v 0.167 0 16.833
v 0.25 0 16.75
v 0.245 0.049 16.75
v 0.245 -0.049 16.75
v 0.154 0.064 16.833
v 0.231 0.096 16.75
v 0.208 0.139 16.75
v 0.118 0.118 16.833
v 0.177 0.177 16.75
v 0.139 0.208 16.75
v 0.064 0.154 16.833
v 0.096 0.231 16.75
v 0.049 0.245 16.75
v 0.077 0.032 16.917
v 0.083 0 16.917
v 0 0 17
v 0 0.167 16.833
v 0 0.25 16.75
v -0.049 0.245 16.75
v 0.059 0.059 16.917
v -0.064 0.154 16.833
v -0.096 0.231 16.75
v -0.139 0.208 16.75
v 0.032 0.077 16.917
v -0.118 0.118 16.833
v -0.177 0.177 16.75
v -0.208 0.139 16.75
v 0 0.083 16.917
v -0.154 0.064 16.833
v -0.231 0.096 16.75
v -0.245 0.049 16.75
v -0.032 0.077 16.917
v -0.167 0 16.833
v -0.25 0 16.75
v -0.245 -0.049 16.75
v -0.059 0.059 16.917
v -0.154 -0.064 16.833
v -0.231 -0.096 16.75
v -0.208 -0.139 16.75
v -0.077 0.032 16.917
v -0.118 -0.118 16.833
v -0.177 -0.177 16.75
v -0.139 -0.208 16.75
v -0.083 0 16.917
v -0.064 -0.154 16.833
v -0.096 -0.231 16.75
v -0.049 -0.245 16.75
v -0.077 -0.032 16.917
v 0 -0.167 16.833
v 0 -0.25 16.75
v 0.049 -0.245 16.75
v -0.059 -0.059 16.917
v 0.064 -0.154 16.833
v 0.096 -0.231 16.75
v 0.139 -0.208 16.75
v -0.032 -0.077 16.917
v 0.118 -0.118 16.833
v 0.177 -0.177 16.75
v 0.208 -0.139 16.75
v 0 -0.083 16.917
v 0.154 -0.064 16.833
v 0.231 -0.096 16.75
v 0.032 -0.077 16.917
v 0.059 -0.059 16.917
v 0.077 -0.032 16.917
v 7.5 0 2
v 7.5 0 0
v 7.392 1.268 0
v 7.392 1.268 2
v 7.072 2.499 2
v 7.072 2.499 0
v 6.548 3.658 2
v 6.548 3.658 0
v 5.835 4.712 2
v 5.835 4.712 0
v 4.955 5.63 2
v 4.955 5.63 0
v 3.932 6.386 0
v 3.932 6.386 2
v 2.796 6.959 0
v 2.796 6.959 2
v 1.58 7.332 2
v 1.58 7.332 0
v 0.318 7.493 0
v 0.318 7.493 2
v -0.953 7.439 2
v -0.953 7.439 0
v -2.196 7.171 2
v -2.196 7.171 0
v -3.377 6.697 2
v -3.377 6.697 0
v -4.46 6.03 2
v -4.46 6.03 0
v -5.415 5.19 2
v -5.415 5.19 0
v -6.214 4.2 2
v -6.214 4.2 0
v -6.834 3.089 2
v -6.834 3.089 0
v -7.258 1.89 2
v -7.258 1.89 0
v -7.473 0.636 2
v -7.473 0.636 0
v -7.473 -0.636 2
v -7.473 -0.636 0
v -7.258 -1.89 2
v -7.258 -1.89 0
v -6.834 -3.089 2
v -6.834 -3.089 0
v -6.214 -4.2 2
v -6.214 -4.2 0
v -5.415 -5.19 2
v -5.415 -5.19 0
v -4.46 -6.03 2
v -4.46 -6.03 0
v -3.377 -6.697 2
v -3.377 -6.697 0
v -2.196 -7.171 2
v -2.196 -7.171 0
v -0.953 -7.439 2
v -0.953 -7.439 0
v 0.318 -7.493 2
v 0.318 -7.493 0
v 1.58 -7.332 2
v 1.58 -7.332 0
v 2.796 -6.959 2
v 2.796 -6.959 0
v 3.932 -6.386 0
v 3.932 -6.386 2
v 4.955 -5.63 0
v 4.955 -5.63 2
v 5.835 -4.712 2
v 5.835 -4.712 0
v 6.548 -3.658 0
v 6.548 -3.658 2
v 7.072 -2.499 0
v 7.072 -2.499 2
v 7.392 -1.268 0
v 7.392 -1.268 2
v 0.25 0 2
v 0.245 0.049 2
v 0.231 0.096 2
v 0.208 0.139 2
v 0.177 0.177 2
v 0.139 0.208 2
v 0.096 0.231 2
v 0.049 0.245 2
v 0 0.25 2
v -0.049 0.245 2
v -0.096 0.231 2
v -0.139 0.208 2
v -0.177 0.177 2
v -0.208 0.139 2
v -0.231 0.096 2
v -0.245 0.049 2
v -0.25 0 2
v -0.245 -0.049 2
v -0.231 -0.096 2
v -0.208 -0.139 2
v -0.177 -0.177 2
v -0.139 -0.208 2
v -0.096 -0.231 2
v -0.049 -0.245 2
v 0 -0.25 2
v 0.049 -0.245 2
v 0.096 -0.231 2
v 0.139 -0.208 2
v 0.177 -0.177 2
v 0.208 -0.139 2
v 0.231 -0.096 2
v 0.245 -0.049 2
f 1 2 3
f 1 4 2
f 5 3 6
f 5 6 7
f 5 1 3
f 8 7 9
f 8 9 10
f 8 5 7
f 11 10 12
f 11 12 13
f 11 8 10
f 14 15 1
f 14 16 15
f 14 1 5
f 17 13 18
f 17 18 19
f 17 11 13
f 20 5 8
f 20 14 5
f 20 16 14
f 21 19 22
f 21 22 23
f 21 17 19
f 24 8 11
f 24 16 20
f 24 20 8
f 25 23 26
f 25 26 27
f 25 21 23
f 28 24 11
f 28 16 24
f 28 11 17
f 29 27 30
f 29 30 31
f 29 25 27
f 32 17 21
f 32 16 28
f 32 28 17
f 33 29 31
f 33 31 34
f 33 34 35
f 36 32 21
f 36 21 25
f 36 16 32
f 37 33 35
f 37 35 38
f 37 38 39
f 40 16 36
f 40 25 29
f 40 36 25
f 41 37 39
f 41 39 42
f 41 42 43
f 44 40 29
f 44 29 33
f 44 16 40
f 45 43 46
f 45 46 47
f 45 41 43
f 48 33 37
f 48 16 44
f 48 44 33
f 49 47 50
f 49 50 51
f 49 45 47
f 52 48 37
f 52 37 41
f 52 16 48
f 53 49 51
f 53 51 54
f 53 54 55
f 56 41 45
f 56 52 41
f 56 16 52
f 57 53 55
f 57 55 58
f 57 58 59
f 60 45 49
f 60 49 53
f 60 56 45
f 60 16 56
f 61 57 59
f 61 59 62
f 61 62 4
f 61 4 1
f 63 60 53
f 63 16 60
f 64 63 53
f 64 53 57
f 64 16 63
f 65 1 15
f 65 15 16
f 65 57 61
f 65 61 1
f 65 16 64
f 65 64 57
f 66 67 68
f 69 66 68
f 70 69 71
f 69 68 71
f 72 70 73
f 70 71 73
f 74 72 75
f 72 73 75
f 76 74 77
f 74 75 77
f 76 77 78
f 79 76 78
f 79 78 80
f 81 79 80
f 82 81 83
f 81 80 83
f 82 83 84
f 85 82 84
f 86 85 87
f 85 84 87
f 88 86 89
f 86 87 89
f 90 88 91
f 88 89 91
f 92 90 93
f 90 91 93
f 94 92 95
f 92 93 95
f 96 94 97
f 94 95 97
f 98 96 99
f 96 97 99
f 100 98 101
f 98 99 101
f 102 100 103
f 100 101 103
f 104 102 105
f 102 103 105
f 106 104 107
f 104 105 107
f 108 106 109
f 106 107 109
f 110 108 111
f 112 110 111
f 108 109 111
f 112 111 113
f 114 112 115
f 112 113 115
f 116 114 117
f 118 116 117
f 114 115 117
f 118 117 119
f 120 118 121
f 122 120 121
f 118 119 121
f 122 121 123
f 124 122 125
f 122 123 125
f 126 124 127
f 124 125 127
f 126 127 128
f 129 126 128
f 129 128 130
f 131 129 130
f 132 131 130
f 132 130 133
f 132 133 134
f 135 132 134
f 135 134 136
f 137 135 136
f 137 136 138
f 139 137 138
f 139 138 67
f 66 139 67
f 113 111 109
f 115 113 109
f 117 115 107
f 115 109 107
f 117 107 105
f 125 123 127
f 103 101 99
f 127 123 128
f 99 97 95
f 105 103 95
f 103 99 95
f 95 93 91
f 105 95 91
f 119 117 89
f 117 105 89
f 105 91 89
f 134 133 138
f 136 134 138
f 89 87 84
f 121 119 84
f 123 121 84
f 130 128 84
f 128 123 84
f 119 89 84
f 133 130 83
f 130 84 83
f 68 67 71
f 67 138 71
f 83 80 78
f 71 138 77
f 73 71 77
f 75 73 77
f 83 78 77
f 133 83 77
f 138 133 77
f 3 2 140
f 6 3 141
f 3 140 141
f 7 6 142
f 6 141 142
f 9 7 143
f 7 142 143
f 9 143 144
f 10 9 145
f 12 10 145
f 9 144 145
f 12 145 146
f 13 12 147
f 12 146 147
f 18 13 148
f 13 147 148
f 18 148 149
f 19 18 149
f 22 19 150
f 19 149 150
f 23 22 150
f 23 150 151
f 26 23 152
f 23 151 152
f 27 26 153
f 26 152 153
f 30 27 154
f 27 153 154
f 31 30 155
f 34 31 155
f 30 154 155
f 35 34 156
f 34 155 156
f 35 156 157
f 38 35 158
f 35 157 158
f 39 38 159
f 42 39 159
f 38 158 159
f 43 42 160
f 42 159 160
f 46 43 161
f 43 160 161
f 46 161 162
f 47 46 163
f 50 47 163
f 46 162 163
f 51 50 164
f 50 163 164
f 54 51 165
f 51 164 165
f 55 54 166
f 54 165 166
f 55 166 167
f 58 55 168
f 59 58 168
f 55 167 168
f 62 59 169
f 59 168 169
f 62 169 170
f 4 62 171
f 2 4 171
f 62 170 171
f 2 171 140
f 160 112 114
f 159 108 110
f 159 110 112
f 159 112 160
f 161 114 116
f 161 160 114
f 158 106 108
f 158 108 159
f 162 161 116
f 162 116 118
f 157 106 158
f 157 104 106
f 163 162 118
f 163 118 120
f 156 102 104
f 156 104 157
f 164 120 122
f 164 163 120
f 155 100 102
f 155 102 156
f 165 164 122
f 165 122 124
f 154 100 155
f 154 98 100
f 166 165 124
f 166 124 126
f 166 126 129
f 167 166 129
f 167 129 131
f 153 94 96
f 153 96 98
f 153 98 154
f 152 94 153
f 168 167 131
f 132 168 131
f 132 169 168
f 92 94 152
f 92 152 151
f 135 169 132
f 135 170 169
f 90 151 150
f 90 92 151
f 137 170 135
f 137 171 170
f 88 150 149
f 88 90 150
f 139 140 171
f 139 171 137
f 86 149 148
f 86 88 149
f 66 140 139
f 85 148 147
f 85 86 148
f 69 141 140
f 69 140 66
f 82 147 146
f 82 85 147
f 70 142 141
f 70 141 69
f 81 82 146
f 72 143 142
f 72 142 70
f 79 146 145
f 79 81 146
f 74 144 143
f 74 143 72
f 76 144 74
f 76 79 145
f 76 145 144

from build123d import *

# Parameters (mm, degrees)
SKETCH1_R           = 7.5
BOSS_EXTRUDE1_DEPTH = 2
SKETCH2_R           = 0.25
BOSS_EXTRUDE2_DEPTH = 15
CHAMFER1_SIZE       = 0.25


with BuildPart() as part:
    # Sketch1 → Boss-Extrude1 (new body)
    with BuildSketch(Plane.XY):
        Circle(SKETCH1_R)
    extrude(amount=BOSS_EXTRUDE1_DEPTH)

    # Sketch2 → Boss-Extrude2 (add)
    with BuildSketch(Plane.XY.offset(2)):
        Circle(SKETCH2_R)
    extrude(amount=BOSS_EXTRUDE2_DEPTH)

    # Chamfer1
    chamfer1_edges = [part.edges().sort_by_distance(p)[0] for p in [
        (-0.25, 0, 17),
    ]]
    chamfer(chamfer1_edges, length=CHAMFER1_SIZE)


solid = part.part
